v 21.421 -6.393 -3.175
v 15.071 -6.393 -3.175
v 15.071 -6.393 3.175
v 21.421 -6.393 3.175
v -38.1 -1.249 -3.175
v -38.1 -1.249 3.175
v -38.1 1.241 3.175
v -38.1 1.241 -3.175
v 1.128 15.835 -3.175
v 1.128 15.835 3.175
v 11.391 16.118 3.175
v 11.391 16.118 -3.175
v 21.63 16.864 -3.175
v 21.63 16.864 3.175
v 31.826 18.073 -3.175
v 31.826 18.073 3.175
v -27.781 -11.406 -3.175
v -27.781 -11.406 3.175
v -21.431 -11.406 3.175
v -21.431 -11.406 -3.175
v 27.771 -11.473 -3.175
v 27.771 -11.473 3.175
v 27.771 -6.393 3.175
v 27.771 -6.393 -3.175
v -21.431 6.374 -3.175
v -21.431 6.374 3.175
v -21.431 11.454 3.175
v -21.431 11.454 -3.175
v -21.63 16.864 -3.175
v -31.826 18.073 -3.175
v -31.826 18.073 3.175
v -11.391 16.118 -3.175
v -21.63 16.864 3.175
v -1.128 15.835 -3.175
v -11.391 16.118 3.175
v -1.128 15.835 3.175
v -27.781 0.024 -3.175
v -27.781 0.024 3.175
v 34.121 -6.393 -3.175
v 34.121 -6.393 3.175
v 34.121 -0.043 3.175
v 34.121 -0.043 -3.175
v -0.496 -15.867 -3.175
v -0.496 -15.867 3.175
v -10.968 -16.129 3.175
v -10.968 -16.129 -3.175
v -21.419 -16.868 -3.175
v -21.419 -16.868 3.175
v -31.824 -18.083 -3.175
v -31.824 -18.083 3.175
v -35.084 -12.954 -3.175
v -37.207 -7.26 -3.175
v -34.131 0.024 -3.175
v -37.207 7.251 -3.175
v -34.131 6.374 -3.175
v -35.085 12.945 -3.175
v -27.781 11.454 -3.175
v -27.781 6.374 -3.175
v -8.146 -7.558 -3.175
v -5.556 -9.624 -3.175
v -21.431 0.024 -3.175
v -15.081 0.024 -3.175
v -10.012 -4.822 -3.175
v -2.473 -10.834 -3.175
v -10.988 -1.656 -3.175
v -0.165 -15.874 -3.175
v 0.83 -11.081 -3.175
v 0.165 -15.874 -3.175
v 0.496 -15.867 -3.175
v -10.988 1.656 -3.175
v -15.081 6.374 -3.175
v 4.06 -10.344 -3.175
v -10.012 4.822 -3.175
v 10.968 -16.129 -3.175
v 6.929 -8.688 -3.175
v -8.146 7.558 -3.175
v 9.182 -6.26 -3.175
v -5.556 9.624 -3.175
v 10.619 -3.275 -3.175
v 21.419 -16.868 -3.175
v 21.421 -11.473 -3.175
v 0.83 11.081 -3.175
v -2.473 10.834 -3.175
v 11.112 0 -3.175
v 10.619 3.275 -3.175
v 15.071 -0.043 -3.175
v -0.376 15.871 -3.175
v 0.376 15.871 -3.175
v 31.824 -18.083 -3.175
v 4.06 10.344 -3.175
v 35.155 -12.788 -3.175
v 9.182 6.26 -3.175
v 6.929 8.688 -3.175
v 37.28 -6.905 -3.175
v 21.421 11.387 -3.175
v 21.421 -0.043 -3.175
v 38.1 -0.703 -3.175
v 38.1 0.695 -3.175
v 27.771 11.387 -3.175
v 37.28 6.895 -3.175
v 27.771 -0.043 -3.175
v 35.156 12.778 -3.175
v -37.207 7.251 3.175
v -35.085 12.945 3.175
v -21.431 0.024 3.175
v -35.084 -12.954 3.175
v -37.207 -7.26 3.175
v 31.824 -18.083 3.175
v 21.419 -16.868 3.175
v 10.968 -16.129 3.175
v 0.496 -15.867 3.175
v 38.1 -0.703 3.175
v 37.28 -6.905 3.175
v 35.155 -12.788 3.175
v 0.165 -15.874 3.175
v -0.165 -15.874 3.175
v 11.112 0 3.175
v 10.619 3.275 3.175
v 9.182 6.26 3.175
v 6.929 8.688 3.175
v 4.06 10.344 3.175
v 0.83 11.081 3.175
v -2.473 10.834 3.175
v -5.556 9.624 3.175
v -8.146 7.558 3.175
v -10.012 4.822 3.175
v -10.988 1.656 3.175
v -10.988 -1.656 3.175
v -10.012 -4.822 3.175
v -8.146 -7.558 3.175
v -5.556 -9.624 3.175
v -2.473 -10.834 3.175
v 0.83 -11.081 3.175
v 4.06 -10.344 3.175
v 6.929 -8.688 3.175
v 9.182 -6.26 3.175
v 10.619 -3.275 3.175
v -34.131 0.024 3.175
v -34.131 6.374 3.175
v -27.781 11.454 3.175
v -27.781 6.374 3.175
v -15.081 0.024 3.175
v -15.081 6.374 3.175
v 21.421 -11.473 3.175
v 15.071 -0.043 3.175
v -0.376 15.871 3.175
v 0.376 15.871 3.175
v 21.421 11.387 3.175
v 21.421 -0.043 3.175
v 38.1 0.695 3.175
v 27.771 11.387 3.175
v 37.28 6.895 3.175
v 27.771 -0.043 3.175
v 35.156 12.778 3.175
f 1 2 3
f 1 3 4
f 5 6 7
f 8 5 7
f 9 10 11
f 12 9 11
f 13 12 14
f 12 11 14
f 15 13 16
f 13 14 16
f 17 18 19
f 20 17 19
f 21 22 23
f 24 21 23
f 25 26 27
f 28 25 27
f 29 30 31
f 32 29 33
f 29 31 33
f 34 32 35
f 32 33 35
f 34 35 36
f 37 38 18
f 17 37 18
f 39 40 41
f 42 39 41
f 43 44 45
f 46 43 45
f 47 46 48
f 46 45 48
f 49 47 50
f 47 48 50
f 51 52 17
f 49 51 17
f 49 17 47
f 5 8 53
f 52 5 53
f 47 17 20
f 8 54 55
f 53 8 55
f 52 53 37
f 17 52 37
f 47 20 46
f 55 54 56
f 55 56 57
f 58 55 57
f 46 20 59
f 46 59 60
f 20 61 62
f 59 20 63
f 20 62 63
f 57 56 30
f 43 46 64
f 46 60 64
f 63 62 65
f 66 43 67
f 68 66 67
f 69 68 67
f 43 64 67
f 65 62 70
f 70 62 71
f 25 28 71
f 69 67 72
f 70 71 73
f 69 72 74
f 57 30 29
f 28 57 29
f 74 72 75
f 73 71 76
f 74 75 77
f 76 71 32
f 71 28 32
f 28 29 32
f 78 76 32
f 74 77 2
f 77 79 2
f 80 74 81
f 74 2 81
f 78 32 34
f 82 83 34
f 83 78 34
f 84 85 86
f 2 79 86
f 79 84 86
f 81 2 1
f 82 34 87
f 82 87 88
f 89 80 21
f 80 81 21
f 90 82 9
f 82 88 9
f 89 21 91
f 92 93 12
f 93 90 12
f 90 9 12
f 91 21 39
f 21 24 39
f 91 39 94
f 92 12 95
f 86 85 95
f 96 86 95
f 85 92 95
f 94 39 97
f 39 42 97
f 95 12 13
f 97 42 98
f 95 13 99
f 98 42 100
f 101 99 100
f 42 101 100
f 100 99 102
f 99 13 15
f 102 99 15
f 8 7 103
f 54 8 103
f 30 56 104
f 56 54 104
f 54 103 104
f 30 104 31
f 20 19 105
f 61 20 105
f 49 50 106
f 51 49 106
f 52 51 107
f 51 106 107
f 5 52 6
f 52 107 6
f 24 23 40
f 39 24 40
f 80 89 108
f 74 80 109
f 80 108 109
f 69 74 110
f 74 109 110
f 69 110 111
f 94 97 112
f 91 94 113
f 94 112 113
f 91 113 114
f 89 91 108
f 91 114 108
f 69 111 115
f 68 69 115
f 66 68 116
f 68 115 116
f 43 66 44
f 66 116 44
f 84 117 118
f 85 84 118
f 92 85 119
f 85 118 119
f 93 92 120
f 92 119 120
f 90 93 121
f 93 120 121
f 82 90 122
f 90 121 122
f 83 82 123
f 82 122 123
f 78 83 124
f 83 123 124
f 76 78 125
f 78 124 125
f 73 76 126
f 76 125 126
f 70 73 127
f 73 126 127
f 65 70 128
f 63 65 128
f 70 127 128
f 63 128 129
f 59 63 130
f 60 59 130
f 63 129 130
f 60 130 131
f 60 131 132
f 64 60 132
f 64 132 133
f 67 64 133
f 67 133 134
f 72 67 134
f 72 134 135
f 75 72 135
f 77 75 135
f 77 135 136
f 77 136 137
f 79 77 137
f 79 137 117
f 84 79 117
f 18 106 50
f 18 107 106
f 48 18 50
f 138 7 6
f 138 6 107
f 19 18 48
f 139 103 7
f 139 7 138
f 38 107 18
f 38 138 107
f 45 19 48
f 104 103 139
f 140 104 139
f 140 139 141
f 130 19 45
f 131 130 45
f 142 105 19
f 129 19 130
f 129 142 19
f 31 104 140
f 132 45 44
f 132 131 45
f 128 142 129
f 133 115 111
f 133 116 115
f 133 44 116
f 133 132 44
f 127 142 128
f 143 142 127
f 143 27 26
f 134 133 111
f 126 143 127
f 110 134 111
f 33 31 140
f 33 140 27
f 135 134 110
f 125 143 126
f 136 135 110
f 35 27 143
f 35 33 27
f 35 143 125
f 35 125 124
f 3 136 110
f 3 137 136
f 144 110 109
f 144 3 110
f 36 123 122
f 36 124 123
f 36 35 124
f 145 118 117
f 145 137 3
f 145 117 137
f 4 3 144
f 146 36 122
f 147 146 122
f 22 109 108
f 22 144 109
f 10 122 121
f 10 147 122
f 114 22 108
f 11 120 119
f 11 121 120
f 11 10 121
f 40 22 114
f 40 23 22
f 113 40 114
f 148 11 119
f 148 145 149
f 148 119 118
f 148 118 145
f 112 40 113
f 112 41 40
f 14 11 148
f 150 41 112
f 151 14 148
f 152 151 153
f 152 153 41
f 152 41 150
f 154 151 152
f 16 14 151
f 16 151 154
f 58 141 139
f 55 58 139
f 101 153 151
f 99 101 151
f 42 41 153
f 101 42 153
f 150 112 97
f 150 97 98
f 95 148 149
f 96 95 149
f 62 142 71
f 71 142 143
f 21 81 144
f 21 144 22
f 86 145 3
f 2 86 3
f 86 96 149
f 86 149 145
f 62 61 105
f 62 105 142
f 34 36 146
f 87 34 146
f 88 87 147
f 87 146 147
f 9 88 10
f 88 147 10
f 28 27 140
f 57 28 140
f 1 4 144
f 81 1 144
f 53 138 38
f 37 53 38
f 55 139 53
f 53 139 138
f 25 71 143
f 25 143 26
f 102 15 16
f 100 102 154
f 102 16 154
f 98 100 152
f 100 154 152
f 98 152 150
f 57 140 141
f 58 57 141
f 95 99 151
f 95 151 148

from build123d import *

# Parameters (mm, degrees)
F0_W          = 76.2
F0_H          = 76.2
F1_DEPTH      = 3.175
F1_DEPTH_BACK = 3.175
F2_R          = 11.1125
F3_DEPTH      = 25.4
F5_DEPTH      = 25.4
F7_DEPTH      = 25.4
F9_DEPTH      = 25.4
F10_DEPTH     = 25.4


with BuildPart() as f1:
    # F0 (on Top) → F1 (new body, two sides)
    with BuildSketch(Plane.XY) as f1_sk:
        Rectangle(F0_W, F0_H)
    extrude(amount=F1_DEPTH)
    extrude(f1_sk.sketch, amount=-F1_DEPTH_BACK)

    # F2 (on face) → F3 (cut)
    with BuildSketch(Plane.XY.offset(3.175)):
        Circle(F2_R)
    extrude(amount=-F3_DEPTH, mode=Mode.SUBTRACT)

    # F4 (on face) → F5 (cut)
    with BuildSketch(Plane.XY.offset(3.175)):
        with BuildLine():
            ThreePointArc((-1.1282384551, 15.834857214), (0, 15.875), (1.1282384551, 15.834857214))
            ThreePointArc((1.1282384551, 15.834857214), (19.6798871657, 16.6861460125), (38.1, 19.05))
            Line((38.1, 19.05), (38.1, 38.1))
            Line((38.1, 38.1), (-38.1, 38.1))
            Line((-38.1, 38.1), (-38.1, 19.05))
            ThreePointArc((-38.1, 19.05), (-19.6798871657, 16.6861460125), (-1.1282384551, 15.834857214))
        make_face()
        with BuildLine():
            ThreePointArc((38.1, -19.05), (19.3632933861, -16.6846942182), (0.4955788466, -15.867262732))
            ThreePointArc((0.4955788466, -15.867262732), (0, -15.875), (-0.4955788466, -15.867262732))
            ThreePointArc((-0.4955788466, -15.867262732), (-19.3632933861, -16.6846942182), (-38.1, -19.05))
            Line((-38.1, -19.05), (-38.1, -38.1))
            Line((-38.1, -38.1), (38.1, -38.1))
            Line((38.1, -38.1), (38.1, -19.05))
        make_face()
    extrude(amount=-F5_DEPTH, mode=Mode.SUBTRACT)

    # F6 (on face) → F7 (cut)
    with BuildSketch(Plane.XY.offset(3.175)):
        with BuildLine():
            ThreePointArc((-31.8240671696, -18.0829596142), (-36.2945422432, -10.1630092501), (-38.1, -1.2494755264))
            Line((-38.1, -1.2494755264), (-38.1, -19.05))
            ThreePointArc((-38.1, -19.05), (-34.9653769343, -18.5447820191), (-31.8240671696, -18.0829596142))
        make_face()
        with BuildLine():
            Line((38.1, -19.05), (38.1, -0.7031421254))
            ThreePointArc((38.1, -0.7031421254), (36.375777878, -9.9035605014), (31.8240671696, -18.0829596142))
            ThreePointArc((31.8240671696, -18.0829596142), (34.9653769343, -18.5447820191), (38.1, -19.05))
        make_face()
        with BuildLine():
            Line((38.1, 0.6947725682), (38.1, 19.05))
            ThreePointArc((38.1, 19.05), (34.9662556013, 18.5393499989), (31.8256799416, 18.072550357))
            ThreePointArc((31.8256799416, 18.072550357), (36.3762194276, 9.8939680843), (38.1, 0.6947725682))
        make_face()
        with BuildLine():
            ThreePointArc((-38.1, 1.2410984186), (-36.2949953659, 10.153416681), (-31.8256799416, 18.072550357))
            ThreePointArc((-31.8256799416, 18.072550357), (-34.9662556013, 18.5393499989), (-38.1, 19.05))
            Line((-38.1, 19.05), (-38.1, 1.2410984186))
        make_face()
    extrude(amount=-F7_DEPTH, mode=Mode.SUBTRACT)

    # F8 (on face) → F9 (cut)
    with BuildSketch(Plane.XY.offset(3.175)):
        Polygon((-21.43125, 11.4536878589), (-24.60625, 11.4536878589), (-27.78125, 11.4536878589), (-27.78125, 6.3736878589), (-34.13125, 6.3736878589), (-34.13125, 0.0236878589), (-27.78125, 0.0236878589), (-27.78125, -11.4063121411), (-21.43125, -11.4063121411), (-21.43125, 0.0236878589), (-15.08125, 0.0236878589), (-15.08125, 6.3736878589), (-21.43125, 6.3736878589), align=None)
        Polygon((21.4206709149, -11.47287669), (24.5575709149, -11.47287669), (27.7706709149, -11.47287669), (27.7706709149, -6.39287669), (34.1206709149, -6.39287669), (34.1206709149, -0.04287669), (27.7706709149, -0.04287669), (27.7706709149, 11.38712331), (21.4206709149, 11.38712331), (21.4206709149, -0.04287669), (15.0706709149, -0.04287669), (15.0706709149, -6.39287669), (21.4206709149, -6.39287669), align=None)
    extrude(amount=-F9_DEPTH, mode=Mode.SUBTRACT)

    # F8 (on face) → F10 (cut)
    with BuildSketch(Plane.XY.offset(3.175)):
        Polygon((-21.43125, 11.4536878589), (-24.60625, 11.4536878589), (-27.78125, 11.4536878589), (-27.78125, 6.3736878589), (-34.13125, 6.3736878589), (-34.13125, 0.0236878589), (-27.78125, 0.0236878589), (-27.78125, -11.4063121411), (-21.43125, -11.4063121411), (-21.43125, 0.0236878589), (-15.08125, 0.0236878589), (-15.08125, 6.3736878589), (-21.43125, 6.3736878589), align=None)
        Polygon((21.4206709149, -11.47287669), (24.5575709149, -11.47287669), (27.7706709149, -11.47287669), (27.7706709149, -6.39287669), (34.1206709149, -6.39287669), (34.1206709149, -0.04287669), (27.7706709149, -0.04287669), (27.7706709149, 11.38712331), (21.4206709149, 11.38712331), (21.4206709149, -0.04287669), (15.0706709149, -0.04287669), (15.0706709149, -6.39287669), (21.4206709149, -6.39287669), align=None)
    extrude(amount=-F10_DEPTH, mode=Mode.SUBTRACT)


solid = f1.part
